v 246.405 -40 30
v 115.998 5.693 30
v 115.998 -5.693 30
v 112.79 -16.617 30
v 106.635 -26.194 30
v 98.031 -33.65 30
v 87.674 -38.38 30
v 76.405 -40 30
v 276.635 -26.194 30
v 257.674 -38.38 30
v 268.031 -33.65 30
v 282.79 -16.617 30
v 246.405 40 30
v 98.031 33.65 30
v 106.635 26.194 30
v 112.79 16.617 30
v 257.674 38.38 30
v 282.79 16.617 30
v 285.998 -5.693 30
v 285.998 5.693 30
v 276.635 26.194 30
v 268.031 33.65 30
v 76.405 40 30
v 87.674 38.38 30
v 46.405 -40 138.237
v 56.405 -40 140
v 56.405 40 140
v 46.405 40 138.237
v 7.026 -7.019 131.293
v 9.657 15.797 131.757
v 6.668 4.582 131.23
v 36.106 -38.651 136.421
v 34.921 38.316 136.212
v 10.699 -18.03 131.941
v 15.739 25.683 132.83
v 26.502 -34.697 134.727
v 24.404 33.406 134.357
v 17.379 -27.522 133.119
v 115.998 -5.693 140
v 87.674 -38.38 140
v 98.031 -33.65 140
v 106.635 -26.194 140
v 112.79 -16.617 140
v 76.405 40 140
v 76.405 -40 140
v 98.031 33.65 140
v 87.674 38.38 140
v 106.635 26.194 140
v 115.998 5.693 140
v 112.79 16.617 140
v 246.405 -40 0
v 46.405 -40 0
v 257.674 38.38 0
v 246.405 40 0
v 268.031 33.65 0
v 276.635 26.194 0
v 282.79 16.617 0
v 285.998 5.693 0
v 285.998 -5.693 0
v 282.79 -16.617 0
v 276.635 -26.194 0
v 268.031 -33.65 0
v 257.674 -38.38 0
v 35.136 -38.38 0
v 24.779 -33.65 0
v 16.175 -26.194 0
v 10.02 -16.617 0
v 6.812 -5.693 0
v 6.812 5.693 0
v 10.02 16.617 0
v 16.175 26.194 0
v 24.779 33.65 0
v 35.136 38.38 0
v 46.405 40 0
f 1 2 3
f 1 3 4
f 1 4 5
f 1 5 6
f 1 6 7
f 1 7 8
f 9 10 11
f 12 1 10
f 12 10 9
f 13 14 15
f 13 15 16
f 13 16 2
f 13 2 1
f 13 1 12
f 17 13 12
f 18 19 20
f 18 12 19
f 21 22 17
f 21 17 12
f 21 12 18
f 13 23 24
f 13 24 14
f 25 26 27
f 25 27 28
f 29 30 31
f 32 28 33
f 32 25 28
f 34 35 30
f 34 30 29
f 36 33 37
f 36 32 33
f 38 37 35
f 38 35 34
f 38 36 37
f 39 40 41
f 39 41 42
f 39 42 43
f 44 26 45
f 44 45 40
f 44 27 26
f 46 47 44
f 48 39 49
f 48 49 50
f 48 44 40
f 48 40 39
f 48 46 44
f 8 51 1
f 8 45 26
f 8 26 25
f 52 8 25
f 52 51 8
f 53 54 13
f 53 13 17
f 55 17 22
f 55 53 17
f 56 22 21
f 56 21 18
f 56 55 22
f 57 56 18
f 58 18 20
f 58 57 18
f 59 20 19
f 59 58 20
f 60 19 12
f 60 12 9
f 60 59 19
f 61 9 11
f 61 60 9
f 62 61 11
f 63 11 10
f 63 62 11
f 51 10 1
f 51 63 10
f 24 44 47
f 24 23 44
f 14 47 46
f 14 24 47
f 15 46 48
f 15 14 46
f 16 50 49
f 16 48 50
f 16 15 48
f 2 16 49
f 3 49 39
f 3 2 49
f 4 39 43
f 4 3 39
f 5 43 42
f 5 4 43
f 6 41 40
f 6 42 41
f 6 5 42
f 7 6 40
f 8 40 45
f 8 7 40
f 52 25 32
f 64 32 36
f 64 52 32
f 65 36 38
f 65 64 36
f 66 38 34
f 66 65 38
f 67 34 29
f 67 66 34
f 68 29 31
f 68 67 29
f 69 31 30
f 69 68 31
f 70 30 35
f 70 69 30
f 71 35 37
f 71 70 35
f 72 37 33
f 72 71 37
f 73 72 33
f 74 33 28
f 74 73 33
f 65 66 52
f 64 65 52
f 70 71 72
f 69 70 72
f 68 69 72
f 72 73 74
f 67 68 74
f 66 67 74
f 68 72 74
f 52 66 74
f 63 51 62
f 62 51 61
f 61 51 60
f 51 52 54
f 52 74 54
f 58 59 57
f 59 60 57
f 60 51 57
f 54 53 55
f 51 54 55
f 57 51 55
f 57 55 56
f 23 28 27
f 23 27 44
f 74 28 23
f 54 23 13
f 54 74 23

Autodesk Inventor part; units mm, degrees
ref_plane "YZ Plane" through (0, 0, 0) normal (1, 0, 0) x (0, 1, 0)
ref_plane "XZ Plane" through (0, 0, 0) normal (0, 1, 0) x (-1, 0, 0)
ref_plane "XY Plane" through (0, 0, 0) normal (0, 0, 1) x (1, 0, 0)
sketch "Sketch1" plane through (0, 0, 0) normal (0, 0, 1) x (1, 0, 0)
  line L0 (0, 15.9441) -> (0, -15.9441) construction
  line L1 (11.6084, 0) -> (-11.6084, 0) construction
  line L2 (46.4051, 40) -> (246.4051, 40)
  line L3 (246.4051, 40) -> (246.4051, -40)
  line L4 (246.4051, -40) -> (46.4051, -40)
  line L5 (46.4051, -40) -> (46.4051, 40)
  circle A0 centre (46.4051, 0) radius 40
  circle A1 centre (246.4051, 0) radius 40
  point P0 (0, 0)
  point P1 (0, 0)
  dimension "d0" = 80
  dimension "d1" = 200
extrude "Extrusion1" add sketch "Sketch1" along normal blind 30
sketch "Sketch2" plane through (0, 0, 30) normal (0, 0, 1) x (1, 0, 0)
  arc A0 (46.4051, 40) -> (46.4051, -40) centre (46.4051, 0) ccw projected
  circle A1 centre (46.4051, 0) radius 40
  line L0 (46.4051, -40) -> (46.4051, 40)
  line L1 (116.4051, 0) -> (76.4051, 0)
  circle A2 centre (76.4051, 0) radius 40
  line L2 (46.4051, 40) -> (76.4051, 40)
  line L3 (76.4051, -40) -> (46.4051, -40)
  point P0 (0, 0)
extrude "Extrusion2" add sketch "Sketch2" along normal blind 110
sketch "Sketch3" plane through (46.4051, -40, 0) normal (0, -1, 0) x (1, 0, 0)
  line L0 (-40, 140) -> (0, 140) projected
  line L1 (0, 140) -> (10, 140)
  line L2 (10, 140) -> (-81.693, 123.8321)
  line L3 (-81.693, 123.8321) -> (-81.693, 140)
  line L4 (-81.693, 140) -> (0, 140)
  point P0 (-46.4051, 0)
extrude "Extrusion3" cut sketch "Sketch3" against normal through all
properties part number "CANH TAY 2"
